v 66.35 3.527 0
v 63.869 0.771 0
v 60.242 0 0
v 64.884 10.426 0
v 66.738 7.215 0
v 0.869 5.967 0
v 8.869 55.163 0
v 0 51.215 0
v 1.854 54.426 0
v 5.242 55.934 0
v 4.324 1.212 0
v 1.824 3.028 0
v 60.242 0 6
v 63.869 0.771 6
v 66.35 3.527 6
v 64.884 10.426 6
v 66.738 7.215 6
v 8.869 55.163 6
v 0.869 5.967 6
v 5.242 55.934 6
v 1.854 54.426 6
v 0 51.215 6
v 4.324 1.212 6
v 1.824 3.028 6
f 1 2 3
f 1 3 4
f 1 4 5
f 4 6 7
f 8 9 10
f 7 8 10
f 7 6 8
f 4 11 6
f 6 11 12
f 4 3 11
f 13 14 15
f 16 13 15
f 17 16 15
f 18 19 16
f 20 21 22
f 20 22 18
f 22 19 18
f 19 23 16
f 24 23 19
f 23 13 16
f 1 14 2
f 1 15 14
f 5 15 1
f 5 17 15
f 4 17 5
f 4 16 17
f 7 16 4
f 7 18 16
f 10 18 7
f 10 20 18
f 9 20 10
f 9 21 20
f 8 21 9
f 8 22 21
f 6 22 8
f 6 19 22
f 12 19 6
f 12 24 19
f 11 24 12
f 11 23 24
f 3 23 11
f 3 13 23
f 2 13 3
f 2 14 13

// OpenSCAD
$fn = 32;

// ----------------------------------------------------------------------
// Lever arm: two bosses 10 and 12 mm, 55 mm between centres
// ----------------------------------------------------------------------

// --- parameters (mm) ---
profile_height = 6;       // extrusion height
profile_points = 12;      // points of the closed outline

profile = [[0, 51.215], [0.869, 5.967], [1.824, 3.028], [4.324, 1.212], [60.242, 0], [63.869, 0.771], [66.35, 3.527], [66.738, 7.215], [64.884, 10.426], [8.869, 55.163], [5.242, 55.934], [1.854, 54.426]];  // single closed polygon, 12 points, counter clockwise

// --- the one profile operation ---
linear_extrude(height = profile_height) polygon(points = profile);
